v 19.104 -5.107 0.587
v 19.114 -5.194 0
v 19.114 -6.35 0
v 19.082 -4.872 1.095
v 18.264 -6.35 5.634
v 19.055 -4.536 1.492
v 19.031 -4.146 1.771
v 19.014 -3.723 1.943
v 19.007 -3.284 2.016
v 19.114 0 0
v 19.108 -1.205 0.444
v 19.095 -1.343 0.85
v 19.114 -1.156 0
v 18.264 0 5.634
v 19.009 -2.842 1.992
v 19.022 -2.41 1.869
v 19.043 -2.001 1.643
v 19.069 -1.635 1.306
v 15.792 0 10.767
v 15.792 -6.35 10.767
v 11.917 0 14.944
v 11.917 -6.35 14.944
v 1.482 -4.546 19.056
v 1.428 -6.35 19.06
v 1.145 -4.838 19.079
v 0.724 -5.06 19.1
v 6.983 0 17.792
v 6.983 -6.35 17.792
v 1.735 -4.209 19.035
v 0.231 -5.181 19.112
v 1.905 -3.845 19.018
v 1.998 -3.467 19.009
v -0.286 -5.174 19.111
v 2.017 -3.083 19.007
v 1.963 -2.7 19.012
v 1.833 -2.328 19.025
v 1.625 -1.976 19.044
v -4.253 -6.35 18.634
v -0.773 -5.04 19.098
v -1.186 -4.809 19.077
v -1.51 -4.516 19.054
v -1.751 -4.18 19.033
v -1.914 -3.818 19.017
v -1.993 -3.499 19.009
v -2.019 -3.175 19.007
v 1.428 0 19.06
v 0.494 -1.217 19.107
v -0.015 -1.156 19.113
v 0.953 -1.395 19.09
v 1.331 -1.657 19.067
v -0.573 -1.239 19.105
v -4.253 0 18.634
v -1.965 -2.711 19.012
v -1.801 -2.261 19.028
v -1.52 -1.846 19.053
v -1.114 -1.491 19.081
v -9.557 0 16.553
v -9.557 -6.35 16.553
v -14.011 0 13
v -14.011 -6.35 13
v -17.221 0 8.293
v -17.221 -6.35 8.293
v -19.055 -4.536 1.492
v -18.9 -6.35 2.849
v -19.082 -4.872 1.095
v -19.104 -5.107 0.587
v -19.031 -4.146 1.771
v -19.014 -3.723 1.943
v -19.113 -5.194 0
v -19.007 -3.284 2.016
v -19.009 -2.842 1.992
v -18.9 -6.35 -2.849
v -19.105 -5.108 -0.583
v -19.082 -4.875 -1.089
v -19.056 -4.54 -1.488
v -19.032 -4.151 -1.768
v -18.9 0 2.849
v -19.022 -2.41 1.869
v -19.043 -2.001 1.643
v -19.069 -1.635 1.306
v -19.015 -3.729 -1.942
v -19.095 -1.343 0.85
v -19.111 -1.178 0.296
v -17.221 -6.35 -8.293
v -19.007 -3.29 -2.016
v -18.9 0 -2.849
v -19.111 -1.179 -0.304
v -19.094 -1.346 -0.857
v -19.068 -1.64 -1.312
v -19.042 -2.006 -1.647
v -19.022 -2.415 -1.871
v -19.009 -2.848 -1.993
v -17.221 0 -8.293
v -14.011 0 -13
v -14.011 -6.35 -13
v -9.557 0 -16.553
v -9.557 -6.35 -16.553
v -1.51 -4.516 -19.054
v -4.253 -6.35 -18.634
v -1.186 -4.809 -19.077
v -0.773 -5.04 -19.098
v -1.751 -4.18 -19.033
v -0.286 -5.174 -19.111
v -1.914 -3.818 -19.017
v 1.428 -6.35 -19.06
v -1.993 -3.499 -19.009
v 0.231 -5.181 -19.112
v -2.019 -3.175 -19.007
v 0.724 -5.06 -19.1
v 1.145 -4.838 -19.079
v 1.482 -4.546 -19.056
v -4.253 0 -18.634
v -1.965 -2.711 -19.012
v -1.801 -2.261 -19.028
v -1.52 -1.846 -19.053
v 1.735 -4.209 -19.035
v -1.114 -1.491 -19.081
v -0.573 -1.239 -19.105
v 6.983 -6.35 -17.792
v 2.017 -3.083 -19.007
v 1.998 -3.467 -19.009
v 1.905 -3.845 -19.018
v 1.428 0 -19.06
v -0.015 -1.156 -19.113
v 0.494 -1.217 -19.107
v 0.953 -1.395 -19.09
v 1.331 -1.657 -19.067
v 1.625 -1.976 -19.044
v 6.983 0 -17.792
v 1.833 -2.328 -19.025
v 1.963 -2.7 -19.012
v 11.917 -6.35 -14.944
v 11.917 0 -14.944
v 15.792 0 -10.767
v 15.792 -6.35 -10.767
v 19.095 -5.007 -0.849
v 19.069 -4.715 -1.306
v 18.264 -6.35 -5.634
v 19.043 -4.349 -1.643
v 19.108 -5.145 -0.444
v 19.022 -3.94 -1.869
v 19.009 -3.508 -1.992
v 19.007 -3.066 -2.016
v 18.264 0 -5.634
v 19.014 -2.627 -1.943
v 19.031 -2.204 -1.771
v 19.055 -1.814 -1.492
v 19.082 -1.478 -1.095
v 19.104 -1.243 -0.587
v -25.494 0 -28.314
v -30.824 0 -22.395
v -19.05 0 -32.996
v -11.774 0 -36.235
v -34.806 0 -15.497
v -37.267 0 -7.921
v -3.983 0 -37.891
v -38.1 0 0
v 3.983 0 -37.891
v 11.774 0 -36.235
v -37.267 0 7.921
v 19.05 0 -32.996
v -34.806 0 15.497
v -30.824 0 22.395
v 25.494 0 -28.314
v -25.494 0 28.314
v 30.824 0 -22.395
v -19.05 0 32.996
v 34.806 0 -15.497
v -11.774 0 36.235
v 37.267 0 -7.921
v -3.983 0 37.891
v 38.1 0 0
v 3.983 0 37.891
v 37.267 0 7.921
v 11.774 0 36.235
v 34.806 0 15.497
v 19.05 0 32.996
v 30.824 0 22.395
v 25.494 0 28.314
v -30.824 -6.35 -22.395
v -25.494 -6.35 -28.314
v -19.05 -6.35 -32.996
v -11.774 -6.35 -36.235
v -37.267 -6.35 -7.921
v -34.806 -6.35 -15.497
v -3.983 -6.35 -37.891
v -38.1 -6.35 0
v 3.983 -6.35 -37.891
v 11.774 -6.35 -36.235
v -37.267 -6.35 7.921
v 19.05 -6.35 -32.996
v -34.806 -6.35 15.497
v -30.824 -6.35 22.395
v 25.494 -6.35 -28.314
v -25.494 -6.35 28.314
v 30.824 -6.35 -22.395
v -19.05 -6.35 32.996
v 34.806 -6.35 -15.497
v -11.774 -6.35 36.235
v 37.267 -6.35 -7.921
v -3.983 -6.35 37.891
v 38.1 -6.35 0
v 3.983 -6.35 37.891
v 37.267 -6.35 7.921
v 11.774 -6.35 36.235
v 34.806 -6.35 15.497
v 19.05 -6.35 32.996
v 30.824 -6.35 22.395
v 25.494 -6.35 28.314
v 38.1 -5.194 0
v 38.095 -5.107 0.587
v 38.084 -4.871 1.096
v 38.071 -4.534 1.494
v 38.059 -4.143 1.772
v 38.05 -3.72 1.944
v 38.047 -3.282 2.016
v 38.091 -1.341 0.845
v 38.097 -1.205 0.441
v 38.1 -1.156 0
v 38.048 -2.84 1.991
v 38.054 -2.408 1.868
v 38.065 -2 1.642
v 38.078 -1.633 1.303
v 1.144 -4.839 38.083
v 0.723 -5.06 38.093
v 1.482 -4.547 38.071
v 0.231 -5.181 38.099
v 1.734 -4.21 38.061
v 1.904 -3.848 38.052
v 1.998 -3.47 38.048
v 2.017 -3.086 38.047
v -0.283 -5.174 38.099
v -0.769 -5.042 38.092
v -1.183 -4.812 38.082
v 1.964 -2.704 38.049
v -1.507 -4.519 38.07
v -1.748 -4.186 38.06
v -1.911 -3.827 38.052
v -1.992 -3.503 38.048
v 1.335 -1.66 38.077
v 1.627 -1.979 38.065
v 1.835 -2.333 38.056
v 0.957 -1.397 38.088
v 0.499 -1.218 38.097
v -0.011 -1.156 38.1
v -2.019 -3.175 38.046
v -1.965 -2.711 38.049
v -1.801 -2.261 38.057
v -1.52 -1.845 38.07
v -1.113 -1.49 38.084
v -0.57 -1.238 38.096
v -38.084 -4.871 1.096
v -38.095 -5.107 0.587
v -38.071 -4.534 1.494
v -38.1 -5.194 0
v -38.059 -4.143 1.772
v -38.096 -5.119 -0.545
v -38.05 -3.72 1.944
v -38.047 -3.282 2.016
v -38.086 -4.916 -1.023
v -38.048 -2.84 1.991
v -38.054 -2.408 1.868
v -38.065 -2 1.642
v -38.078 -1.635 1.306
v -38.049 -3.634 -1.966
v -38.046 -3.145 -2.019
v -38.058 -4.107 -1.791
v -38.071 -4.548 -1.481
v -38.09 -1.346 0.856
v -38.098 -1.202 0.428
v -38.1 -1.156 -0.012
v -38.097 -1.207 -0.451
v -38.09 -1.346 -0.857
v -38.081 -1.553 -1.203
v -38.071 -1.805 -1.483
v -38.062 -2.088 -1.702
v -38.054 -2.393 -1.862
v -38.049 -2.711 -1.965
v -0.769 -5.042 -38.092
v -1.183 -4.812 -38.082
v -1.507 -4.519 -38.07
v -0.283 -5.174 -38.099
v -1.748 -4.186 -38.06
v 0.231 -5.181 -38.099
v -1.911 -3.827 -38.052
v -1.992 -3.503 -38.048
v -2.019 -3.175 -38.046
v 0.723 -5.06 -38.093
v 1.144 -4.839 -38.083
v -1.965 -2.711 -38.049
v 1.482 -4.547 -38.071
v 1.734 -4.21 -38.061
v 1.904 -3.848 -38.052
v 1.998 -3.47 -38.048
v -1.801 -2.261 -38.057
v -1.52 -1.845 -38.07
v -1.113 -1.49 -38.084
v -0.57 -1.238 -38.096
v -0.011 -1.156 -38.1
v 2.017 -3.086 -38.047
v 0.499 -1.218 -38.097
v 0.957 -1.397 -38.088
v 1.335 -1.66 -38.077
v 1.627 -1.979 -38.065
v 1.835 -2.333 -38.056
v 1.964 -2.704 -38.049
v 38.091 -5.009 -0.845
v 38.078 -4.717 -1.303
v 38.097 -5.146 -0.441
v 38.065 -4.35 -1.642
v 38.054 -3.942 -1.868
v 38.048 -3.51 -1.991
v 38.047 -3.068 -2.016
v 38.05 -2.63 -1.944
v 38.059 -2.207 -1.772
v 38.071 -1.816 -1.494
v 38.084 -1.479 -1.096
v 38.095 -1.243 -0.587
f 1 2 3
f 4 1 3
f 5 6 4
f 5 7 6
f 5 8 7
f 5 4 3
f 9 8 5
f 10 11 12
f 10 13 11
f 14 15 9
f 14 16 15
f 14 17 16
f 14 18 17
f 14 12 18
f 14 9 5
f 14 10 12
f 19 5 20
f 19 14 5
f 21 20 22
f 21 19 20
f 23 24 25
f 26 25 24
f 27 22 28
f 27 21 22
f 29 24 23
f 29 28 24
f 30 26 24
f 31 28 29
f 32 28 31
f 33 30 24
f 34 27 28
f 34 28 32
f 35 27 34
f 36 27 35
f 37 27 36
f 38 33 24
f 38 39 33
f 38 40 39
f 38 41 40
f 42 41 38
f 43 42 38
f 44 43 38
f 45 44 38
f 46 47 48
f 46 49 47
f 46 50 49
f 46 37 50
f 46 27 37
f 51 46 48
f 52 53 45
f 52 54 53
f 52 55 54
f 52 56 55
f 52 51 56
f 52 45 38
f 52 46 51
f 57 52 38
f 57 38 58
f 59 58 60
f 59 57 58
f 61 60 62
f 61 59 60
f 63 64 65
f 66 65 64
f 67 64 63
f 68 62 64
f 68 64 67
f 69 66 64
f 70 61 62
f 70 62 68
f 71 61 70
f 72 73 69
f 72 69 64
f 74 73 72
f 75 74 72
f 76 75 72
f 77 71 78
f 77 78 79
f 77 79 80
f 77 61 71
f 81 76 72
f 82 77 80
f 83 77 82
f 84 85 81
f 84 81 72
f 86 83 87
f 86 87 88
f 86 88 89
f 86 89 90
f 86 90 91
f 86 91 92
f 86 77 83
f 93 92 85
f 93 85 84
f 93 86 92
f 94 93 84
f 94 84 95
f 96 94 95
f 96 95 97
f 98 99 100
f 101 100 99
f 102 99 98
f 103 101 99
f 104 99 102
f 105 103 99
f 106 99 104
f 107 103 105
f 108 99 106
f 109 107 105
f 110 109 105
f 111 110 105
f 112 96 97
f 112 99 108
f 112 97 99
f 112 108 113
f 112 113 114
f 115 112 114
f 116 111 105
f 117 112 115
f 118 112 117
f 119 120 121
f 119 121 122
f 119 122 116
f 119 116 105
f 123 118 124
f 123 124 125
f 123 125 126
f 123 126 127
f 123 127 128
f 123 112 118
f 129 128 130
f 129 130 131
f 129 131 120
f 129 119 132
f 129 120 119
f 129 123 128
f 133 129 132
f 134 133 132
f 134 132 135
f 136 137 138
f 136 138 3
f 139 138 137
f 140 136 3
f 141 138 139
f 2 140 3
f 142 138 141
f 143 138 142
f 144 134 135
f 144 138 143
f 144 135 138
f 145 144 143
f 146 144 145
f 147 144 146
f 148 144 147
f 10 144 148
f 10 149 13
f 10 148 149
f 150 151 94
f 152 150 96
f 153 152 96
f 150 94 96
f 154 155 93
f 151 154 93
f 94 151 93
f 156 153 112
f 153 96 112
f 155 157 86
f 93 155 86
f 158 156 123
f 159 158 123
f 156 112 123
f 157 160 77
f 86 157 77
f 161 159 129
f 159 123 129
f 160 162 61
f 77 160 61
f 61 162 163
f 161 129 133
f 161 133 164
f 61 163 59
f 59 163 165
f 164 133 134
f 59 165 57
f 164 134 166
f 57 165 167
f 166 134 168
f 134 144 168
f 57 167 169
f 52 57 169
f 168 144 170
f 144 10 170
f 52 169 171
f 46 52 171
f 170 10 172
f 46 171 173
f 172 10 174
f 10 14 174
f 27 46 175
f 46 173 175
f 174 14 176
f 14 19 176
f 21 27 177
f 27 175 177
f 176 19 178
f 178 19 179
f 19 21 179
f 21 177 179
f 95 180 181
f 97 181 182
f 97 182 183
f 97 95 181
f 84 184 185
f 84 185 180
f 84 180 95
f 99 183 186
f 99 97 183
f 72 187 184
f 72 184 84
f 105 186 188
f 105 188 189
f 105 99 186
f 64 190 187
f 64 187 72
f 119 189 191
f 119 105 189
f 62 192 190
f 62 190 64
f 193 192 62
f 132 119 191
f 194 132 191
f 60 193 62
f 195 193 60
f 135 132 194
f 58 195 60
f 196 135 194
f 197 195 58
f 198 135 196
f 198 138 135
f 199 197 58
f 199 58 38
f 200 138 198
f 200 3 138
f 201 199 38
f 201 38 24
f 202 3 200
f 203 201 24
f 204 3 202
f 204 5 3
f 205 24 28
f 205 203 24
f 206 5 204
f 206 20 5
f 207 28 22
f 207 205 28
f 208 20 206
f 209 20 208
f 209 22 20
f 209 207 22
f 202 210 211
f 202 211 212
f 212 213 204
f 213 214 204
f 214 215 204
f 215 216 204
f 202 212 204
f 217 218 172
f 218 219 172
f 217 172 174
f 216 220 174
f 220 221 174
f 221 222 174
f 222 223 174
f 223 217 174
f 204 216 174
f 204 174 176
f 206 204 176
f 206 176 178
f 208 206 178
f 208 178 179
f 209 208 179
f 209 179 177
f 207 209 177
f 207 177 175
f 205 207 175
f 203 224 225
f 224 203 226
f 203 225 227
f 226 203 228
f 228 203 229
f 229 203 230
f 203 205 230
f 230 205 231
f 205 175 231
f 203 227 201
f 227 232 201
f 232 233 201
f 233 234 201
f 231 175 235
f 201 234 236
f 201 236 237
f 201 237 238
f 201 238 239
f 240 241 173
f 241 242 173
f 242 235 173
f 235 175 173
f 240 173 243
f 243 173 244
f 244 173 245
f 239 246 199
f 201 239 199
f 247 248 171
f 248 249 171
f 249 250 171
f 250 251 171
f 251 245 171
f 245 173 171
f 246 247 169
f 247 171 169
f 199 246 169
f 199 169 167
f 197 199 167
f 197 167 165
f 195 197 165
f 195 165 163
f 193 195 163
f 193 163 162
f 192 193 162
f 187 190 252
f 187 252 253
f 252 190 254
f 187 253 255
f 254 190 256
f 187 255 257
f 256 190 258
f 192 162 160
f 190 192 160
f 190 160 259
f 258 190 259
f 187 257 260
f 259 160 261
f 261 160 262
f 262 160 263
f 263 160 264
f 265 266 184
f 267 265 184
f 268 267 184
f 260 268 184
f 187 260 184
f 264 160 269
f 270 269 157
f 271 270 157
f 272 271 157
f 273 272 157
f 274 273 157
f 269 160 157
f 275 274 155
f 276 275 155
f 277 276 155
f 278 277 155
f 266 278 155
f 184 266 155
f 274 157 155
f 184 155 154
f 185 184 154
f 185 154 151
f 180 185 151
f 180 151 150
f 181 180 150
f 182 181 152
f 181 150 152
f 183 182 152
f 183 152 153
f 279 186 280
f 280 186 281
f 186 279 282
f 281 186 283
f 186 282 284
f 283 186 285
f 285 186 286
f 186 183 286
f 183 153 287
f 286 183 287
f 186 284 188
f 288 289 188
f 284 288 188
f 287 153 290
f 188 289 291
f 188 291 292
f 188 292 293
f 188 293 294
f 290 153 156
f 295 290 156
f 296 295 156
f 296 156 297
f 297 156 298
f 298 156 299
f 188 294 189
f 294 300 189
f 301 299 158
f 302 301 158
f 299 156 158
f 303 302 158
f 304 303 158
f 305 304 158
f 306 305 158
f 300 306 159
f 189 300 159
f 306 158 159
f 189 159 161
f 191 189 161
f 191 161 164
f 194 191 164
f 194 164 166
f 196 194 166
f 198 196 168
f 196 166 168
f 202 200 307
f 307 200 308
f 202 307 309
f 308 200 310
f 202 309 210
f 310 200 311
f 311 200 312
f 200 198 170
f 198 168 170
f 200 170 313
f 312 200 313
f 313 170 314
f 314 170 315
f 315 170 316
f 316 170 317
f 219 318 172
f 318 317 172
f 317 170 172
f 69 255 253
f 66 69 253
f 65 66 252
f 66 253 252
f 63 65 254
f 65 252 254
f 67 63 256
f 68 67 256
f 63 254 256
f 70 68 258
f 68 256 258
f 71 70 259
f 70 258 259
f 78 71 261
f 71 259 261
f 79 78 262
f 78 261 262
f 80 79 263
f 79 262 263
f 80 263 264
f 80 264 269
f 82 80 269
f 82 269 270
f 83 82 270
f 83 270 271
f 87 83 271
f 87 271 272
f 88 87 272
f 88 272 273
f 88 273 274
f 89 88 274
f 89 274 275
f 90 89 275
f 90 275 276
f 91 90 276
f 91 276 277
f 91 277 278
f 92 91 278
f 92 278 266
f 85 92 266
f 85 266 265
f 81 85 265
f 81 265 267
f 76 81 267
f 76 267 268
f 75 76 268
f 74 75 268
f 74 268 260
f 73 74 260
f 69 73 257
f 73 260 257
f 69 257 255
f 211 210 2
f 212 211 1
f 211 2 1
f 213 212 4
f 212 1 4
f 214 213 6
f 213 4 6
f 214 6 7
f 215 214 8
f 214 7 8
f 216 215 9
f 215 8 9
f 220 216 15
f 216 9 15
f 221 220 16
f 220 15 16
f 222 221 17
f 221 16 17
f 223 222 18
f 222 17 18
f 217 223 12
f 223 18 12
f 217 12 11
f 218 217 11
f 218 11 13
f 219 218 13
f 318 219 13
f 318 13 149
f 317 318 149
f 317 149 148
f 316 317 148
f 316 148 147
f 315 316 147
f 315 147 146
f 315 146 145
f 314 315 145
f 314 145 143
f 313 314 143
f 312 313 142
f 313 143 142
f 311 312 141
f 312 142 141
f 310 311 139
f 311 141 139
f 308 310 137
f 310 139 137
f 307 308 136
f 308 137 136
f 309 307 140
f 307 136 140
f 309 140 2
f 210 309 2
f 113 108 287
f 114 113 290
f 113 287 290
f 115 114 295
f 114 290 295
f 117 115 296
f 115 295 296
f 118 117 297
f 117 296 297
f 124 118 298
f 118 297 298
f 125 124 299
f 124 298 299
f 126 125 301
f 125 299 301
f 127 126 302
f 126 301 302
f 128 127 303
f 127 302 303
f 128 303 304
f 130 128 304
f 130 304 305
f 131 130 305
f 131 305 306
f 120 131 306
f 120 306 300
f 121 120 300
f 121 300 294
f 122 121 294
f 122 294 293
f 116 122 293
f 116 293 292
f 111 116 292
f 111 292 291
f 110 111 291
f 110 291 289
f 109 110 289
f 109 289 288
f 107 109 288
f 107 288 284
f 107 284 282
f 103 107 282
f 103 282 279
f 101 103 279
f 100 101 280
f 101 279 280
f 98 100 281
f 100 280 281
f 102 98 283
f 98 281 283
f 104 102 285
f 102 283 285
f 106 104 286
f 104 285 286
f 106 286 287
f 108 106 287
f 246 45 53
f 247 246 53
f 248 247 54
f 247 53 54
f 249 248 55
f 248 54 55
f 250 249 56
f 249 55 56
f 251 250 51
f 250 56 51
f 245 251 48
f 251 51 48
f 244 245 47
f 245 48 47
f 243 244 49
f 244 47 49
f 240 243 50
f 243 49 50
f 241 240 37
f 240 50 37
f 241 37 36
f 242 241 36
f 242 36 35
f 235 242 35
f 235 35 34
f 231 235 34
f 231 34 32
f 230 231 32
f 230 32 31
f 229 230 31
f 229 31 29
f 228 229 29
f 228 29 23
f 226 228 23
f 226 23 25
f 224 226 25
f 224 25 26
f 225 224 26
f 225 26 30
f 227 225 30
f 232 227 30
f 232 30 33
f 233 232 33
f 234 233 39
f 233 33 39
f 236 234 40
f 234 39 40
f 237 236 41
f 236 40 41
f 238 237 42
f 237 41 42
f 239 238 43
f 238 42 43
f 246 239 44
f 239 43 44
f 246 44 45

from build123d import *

# Parameters (mm, degrees)
F0_R     = 38.1
F0_R_2   = 19.1135
F1_DEPTH = 6.35
F4_D     = 4.0386
F7_D     = 4.0386


with BuildPart() as f1:
    # F0 (on Front) → F1 (new body)
    with BuildSketch(Plane.XZ):
        Circle(F0_R)
        Circle(F0_R_2, mode=Mode.SUBTRACT)
    extrude(amount=F1_DEPTH)

    # F4 (through all)
    with Locations(Plane.XY.offset(38.1)):
        with Locations((0, -3.175)):
            Hole(F4_D / 2)

    # F7 (through all)
    with Locations(Plane.YZ.offset(38.1)):
        with Locations((-3.175, 0)):
            Hole(F7_D / 2)


solid = f1.part
